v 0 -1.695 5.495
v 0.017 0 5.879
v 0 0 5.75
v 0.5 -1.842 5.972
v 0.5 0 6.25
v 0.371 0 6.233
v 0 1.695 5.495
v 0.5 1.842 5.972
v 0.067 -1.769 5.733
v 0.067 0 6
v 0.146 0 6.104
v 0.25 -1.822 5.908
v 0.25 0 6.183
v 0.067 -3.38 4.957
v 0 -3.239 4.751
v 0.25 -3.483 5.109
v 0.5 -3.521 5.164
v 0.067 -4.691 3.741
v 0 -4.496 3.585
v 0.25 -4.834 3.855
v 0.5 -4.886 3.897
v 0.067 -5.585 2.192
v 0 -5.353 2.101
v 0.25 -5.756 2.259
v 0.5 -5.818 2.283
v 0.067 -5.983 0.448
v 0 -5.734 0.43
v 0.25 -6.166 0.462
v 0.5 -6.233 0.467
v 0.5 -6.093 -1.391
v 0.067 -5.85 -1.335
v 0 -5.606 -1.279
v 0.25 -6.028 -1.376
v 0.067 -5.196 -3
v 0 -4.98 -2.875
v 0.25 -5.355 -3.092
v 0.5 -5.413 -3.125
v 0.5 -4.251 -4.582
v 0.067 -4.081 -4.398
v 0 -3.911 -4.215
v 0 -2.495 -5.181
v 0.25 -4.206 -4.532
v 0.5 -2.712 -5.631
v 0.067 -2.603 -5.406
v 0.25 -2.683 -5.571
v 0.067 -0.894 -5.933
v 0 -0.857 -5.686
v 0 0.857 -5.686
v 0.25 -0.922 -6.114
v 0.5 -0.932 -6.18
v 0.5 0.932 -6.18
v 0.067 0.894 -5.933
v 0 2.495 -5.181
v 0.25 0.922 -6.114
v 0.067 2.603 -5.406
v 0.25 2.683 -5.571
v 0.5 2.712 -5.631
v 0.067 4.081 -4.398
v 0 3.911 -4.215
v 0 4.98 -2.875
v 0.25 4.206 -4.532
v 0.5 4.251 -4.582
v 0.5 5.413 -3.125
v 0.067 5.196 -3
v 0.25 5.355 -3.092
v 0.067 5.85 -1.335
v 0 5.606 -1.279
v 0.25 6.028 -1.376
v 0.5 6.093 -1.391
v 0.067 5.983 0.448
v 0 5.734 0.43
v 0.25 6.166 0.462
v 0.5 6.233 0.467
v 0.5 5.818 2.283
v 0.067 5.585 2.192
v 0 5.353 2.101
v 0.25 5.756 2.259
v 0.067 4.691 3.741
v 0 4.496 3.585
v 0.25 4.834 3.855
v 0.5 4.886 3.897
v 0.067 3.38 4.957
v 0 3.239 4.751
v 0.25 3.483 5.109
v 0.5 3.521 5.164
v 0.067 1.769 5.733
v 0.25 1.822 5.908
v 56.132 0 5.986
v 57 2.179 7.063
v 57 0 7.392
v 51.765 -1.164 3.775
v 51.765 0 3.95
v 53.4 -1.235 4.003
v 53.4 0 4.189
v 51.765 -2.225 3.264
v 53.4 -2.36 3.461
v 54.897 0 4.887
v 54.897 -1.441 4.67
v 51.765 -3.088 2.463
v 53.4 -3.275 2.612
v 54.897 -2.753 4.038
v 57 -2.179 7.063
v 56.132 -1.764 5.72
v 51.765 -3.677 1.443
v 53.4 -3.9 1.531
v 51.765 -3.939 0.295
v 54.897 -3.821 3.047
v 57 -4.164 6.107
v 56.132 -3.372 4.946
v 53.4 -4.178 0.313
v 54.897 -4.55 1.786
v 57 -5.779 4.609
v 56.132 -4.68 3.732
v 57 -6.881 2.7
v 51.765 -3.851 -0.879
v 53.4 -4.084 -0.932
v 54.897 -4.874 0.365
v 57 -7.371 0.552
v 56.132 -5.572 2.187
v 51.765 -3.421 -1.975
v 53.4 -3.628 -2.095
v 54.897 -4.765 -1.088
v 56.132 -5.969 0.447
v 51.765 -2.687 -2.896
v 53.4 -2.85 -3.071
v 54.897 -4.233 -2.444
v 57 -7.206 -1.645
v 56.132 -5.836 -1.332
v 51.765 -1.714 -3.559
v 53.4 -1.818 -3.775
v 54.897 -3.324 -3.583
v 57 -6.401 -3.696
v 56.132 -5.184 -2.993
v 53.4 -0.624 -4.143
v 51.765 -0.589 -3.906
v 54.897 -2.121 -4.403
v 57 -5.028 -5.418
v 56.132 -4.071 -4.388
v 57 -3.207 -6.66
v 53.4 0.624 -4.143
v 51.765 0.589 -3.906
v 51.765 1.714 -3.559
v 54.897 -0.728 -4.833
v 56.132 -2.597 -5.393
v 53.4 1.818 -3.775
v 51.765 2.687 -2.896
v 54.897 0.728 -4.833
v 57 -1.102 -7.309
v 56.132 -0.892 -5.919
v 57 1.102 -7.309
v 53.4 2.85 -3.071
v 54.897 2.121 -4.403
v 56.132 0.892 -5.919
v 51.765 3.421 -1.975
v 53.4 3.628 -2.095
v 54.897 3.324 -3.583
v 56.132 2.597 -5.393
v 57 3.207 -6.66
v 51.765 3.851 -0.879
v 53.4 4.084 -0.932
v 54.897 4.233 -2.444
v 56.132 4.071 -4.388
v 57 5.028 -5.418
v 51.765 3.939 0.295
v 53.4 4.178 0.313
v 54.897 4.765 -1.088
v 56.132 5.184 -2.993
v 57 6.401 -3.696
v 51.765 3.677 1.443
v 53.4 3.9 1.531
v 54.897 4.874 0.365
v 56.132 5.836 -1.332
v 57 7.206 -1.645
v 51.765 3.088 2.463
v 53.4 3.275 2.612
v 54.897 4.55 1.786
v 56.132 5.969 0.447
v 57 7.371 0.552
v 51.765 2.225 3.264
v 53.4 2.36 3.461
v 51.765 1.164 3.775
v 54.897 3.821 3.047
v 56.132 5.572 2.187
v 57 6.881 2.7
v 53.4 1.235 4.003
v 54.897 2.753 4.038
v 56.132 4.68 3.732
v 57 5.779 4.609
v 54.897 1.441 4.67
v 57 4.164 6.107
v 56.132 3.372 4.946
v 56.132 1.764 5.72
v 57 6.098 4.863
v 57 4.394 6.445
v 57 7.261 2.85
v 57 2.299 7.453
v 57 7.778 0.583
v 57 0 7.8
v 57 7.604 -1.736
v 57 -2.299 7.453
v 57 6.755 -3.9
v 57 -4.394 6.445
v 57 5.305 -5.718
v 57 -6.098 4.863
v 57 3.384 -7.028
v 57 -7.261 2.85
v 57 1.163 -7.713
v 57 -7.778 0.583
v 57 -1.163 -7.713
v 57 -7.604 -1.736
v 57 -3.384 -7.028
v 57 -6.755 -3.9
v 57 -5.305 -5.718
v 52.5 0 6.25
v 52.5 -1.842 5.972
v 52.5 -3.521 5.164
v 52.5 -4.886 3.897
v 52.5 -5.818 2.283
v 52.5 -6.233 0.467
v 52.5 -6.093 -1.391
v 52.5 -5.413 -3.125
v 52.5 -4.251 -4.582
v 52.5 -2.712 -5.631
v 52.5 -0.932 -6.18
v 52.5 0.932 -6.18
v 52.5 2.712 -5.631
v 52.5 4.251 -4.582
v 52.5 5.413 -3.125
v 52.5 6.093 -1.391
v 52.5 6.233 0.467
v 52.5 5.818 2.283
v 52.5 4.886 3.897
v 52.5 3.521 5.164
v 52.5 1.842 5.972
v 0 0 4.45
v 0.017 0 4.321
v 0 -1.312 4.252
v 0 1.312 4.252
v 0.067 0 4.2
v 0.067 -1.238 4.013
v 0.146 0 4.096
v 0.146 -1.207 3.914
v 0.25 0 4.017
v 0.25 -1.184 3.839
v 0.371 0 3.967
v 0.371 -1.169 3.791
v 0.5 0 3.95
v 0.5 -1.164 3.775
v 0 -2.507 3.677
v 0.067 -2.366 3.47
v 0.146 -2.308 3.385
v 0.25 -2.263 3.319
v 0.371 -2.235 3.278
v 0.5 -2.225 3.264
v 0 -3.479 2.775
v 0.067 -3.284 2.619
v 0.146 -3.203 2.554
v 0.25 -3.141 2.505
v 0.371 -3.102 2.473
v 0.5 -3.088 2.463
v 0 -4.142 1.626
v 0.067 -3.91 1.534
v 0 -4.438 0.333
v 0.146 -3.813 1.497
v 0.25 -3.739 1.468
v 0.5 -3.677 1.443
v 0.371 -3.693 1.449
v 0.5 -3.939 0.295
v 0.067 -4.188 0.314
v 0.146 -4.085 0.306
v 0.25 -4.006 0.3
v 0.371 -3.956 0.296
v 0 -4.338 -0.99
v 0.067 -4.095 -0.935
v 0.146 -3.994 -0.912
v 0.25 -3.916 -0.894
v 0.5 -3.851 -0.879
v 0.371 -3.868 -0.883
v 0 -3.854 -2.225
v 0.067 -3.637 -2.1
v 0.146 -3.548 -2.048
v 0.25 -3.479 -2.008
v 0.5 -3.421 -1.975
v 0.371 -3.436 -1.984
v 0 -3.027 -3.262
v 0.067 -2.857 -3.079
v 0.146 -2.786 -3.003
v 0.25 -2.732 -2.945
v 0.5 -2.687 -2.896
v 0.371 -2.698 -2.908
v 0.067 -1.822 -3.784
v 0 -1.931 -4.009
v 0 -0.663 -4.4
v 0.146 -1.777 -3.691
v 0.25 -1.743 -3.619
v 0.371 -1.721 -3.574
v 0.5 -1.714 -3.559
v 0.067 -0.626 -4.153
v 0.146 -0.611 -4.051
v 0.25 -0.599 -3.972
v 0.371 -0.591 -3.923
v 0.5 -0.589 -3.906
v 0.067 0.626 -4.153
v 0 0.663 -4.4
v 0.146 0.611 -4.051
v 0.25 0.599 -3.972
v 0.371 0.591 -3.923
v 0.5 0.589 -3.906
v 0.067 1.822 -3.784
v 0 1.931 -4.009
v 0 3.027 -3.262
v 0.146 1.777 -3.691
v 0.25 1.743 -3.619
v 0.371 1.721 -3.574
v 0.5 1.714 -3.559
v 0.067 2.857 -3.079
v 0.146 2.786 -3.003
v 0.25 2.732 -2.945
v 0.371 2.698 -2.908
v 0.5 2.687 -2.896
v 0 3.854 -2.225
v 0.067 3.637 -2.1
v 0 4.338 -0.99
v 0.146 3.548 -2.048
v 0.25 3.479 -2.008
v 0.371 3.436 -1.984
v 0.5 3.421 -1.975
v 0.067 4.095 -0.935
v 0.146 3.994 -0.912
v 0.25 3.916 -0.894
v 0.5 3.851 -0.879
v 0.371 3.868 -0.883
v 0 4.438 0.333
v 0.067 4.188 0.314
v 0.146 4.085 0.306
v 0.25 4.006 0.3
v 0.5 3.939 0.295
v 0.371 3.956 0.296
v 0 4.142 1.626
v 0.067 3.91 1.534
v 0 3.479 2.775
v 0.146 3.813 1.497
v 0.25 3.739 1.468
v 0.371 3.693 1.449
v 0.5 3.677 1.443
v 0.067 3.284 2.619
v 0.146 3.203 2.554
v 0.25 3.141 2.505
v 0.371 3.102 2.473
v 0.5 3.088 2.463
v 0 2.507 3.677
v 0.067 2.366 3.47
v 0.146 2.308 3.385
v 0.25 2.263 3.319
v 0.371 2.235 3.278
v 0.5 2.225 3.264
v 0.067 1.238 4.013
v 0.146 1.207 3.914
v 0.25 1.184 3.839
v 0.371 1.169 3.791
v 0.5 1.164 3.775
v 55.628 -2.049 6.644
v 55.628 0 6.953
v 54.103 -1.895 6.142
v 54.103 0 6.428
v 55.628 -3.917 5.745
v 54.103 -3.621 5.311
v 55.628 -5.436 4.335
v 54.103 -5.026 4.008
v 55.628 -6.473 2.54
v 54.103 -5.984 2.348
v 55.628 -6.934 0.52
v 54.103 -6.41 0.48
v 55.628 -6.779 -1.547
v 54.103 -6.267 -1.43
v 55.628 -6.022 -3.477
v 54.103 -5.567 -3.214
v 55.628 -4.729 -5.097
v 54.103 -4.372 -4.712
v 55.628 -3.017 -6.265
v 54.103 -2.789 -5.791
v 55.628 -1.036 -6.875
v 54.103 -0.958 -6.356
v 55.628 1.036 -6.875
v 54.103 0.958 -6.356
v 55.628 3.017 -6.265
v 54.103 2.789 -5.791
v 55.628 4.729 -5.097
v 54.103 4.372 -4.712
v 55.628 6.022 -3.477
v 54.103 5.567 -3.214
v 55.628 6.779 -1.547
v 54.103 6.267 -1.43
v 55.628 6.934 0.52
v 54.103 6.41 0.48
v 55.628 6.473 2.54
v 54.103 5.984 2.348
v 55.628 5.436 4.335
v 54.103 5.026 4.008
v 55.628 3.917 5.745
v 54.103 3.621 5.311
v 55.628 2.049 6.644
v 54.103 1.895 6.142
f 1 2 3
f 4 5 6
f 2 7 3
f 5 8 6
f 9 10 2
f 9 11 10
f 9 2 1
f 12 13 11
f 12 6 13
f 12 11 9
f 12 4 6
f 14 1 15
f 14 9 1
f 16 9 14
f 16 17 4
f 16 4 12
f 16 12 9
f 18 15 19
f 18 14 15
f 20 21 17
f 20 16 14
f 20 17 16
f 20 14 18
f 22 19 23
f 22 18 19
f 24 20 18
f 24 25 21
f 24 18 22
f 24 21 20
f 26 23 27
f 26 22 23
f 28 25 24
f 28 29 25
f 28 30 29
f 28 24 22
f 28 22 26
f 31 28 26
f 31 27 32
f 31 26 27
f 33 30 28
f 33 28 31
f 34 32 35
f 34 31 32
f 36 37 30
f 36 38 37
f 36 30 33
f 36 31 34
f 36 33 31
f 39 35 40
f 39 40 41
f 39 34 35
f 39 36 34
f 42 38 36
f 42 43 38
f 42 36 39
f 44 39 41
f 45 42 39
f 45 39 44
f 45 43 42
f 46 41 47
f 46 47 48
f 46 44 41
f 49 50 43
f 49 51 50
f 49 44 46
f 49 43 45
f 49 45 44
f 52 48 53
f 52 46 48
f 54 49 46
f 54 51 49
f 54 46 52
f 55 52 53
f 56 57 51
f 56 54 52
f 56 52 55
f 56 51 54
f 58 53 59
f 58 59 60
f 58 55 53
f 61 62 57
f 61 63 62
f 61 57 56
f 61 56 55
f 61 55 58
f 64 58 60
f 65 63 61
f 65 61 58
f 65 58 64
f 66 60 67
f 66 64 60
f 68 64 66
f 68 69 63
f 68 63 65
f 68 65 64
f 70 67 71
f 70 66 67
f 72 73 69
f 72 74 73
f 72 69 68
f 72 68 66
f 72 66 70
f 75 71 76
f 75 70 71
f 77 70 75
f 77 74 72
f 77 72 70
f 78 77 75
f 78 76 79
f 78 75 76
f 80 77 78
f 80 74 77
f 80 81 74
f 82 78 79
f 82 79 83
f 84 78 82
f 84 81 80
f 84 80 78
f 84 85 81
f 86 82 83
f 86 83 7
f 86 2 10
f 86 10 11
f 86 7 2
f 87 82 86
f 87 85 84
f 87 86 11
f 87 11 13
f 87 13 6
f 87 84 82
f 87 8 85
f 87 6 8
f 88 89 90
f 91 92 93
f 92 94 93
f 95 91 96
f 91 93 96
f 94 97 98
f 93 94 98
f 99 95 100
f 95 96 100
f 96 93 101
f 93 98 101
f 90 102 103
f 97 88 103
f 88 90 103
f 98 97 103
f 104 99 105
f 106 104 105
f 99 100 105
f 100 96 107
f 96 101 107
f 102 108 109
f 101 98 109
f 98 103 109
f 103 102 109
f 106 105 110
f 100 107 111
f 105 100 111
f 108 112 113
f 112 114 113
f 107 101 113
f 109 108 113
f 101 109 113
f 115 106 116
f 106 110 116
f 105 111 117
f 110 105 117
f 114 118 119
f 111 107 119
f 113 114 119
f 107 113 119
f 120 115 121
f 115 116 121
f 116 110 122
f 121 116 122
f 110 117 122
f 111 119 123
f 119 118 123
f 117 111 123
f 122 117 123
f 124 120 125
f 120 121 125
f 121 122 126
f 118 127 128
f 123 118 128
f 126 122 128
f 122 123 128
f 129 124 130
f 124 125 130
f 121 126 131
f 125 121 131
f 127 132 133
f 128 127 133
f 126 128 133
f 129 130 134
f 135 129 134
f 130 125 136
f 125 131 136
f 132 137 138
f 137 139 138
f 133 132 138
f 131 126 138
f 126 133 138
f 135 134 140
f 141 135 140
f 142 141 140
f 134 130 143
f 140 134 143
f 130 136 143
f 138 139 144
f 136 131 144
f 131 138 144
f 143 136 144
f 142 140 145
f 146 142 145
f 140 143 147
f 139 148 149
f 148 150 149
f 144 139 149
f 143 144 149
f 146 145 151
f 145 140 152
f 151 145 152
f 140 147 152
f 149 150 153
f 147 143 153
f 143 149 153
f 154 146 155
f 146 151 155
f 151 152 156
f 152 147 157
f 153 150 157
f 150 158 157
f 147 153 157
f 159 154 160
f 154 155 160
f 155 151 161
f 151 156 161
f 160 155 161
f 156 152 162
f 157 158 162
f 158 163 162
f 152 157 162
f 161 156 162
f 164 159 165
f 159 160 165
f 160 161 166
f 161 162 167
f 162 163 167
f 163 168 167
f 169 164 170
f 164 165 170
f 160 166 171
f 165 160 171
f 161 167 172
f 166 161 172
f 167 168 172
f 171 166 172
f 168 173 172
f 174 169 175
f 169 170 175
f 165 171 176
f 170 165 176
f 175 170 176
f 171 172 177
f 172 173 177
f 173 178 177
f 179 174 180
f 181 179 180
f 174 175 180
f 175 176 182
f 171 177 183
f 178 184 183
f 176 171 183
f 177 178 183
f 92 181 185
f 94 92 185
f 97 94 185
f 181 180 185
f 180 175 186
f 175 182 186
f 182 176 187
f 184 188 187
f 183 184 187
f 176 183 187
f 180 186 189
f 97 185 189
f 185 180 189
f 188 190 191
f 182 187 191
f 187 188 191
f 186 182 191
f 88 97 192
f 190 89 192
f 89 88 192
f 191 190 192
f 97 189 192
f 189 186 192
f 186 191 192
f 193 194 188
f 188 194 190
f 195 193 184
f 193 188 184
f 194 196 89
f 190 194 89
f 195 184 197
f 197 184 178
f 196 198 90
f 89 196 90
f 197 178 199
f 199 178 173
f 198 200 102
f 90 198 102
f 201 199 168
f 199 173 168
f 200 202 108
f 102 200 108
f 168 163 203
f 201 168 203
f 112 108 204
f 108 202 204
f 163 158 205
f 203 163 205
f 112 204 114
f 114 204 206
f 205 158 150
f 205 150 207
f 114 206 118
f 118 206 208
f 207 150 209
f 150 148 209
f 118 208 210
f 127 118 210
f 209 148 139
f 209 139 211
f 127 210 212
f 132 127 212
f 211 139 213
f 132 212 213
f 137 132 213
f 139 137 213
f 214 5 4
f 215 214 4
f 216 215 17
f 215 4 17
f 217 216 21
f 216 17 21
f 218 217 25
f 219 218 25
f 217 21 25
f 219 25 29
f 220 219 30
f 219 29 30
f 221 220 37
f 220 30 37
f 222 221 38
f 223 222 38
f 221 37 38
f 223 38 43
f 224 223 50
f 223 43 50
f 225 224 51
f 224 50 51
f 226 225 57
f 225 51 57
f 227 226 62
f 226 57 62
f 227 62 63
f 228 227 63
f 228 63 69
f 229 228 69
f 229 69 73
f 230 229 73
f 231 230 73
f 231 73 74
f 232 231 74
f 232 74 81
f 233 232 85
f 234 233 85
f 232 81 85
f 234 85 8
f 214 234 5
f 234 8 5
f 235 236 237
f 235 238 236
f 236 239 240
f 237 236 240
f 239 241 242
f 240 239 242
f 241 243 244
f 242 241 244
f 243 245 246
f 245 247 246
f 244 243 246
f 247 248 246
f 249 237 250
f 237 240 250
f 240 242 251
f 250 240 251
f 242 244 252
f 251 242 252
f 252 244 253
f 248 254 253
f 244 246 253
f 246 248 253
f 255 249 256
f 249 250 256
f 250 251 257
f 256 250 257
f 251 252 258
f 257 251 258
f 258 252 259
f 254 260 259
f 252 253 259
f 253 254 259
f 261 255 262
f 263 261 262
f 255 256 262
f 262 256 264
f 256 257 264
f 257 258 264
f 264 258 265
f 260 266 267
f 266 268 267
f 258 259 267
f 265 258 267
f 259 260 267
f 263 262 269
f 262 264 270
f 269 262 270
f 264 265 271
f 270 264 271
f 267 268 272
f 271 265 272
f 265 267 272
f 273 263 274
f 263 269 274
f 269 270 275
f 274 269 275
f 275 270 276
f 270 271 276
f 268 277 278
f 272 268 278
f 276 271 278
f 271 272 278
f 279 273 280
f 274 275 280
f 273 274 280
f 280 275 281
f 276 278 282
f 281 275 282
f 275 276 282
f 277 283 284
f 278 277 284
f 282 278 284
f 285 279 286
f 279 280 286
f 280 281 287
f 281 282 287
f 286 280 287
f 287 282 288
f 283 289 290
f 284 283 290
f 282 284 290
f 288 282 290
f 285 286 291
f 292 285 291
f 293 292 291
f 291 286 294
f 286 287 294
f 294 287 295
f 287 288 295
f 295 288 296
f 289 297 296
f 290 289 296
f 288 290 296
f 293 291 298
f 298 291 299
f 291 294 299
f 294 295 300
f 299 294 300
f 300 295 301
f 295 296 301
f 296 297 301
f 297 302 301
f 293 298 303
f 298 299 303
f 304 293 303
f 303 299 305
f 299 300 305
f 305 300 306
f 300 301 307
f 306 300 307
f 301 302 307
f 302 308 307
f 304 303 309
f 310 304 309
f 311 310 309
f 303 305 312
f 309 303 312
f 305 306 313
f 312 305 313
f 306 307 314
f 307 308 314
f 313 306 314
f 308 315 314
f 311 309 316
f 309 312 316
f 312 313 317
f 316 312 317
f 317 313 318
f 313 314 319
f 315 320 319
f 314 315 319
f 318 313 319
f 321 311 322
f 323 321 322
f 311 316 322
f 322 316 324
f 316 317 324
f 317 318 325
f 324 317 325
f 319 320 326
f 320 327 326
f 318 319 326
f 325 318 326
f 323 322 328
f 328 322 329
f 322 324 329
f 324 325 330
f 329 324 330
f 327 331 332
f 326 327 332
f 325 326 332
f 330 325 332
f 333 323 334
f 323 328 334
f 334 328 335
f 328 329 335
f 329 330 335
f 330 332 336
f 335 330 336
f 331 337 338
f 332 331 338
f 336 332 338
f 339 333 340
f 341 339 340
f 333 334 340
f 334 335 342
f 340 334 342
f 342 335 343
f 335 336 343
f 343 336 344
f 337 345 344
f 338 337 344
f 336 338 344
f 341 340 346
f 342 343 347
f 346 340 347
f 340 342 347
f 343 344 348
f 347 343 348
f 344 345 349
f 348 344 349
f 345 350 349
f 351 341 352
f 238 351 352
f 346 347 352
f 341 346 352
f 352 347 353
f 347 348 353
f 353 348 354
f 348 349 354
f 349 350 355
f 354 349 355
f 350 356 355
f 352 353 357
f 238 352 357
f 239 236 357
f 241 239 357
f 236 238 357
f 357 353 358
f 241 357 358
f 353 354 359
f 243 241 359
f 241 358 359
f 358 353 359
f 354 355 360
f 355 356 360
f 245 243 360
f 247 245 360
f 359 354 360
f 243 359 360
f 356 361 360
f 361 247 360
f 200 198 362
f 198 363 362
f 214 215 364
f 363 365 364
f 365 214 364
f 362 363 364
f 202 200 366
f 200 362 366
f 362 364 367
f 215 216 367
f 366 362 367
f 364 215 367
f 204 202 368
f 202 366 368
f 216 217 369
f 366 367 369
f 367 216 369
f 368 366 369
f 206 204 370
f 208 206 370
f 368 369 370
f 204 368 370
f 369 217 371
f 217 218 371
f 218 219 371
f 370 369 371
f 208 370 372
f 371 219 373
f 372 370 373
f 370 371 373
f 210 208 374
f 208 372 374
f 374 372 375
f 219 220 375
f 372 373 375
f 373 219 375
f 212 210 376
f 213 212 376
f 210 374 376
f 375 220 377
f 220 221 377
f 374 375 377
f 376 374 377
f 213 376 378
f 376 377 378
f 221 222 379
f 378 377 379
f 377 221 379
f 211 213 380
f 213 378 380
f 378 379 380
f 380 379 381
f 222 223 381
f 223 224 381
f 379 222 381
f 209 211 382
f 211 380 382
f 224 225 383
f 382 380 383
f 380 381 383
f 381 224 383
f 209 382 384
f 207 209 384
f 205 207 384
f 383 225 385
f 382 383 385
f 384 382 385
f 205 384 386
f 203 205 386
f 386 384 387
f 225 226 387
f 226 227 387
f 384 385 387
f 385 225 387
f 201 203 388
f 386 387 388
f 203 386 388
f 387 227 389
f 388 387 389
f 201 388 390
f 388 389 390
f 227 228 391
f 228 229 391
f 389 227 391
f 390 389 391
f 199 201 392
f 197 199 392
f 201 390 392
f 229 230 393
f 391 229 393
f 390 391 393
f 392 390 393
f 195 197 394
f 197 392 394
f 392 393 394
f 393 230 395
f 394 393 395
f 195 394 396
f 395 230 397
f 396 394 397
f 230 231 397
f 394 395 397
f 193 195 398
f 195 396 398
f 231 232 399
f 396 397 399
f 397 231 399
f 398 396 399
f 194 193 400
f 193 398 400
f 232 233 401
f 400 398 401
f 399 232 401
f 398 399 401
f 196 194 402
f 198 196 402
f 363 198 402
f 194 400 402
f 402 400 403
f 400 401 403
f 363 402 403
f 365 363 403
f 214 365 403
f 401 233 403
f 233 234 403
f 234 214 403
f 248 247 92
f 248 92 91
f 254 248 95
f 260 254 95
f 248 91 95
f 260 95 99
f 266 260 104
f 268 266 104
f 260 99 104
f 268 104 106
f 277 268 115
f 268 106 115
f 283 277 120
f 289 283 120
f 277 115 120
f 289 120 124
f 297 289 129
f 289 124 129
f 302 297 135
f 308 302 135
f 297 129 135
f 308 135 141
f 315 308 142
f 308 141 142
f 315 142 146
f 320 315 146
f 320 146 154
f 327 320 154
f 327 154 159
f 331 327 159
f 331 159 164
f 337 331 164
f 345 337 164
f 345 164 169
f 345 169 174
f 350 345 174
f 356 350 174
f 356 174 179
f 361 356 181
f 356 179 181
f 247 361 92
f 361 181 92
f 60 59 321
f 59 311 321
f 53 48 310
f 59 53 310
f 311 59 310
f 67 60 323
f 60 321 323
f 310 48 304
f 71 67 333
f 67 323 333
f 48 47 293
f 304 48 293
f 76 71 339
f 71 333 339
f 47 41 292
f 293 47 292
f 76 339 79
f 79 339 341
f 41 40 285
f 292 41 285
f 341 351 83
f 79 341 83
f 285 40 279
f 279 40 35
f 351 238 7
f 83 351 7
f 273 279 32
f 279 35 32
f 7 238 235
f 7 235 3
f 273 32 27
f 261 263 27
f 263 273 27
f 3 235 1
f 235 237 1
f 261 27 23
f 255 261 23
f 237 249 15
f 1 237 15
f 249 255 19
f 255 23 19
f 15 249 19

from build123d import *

# Parameters (mm, degrees)
FILLET1_R = 0.5


with BuildPart() as part:
    # Sketch1 → Revolve1 (revolve)
    with BuildSketch(Plane.XY, mode=Mode.PRIVATE) as revolve1_sk:
        with BuildLine():
            Line((0, 6.25), (0, 3.95))
            Line((0, 3.95), (51.764799444, 3.95))
            ThreePointArc((51.764799444, 3.95), (54.897363756, 4.887450418), (57, 7.391585654))
            Line((57, 7.391585654), (57, 7.8))
            ThreePointArc((57, 7.8), (54.879732128, 6.648358339), (52.5, 6.25))
            Line((52.5, 6.25), (0, 6.25))
        make_face()
    revolve(revolve1_sk.sketch.rotate(Axis((0, 0, 0), (1, 0, 0)), 90), axis=Axis((0, 0, 0), (1, 0, 0)))

    # Fillet1
    fillet1_edges = [part.edges().sort_by_distance(p)[0] for p in [
        (0, 0, -3.95),
        (0, 0, -6.25),
    ]]
    fillet(fillet1_edges, radius=FILLET1_R)


solid = part.part
